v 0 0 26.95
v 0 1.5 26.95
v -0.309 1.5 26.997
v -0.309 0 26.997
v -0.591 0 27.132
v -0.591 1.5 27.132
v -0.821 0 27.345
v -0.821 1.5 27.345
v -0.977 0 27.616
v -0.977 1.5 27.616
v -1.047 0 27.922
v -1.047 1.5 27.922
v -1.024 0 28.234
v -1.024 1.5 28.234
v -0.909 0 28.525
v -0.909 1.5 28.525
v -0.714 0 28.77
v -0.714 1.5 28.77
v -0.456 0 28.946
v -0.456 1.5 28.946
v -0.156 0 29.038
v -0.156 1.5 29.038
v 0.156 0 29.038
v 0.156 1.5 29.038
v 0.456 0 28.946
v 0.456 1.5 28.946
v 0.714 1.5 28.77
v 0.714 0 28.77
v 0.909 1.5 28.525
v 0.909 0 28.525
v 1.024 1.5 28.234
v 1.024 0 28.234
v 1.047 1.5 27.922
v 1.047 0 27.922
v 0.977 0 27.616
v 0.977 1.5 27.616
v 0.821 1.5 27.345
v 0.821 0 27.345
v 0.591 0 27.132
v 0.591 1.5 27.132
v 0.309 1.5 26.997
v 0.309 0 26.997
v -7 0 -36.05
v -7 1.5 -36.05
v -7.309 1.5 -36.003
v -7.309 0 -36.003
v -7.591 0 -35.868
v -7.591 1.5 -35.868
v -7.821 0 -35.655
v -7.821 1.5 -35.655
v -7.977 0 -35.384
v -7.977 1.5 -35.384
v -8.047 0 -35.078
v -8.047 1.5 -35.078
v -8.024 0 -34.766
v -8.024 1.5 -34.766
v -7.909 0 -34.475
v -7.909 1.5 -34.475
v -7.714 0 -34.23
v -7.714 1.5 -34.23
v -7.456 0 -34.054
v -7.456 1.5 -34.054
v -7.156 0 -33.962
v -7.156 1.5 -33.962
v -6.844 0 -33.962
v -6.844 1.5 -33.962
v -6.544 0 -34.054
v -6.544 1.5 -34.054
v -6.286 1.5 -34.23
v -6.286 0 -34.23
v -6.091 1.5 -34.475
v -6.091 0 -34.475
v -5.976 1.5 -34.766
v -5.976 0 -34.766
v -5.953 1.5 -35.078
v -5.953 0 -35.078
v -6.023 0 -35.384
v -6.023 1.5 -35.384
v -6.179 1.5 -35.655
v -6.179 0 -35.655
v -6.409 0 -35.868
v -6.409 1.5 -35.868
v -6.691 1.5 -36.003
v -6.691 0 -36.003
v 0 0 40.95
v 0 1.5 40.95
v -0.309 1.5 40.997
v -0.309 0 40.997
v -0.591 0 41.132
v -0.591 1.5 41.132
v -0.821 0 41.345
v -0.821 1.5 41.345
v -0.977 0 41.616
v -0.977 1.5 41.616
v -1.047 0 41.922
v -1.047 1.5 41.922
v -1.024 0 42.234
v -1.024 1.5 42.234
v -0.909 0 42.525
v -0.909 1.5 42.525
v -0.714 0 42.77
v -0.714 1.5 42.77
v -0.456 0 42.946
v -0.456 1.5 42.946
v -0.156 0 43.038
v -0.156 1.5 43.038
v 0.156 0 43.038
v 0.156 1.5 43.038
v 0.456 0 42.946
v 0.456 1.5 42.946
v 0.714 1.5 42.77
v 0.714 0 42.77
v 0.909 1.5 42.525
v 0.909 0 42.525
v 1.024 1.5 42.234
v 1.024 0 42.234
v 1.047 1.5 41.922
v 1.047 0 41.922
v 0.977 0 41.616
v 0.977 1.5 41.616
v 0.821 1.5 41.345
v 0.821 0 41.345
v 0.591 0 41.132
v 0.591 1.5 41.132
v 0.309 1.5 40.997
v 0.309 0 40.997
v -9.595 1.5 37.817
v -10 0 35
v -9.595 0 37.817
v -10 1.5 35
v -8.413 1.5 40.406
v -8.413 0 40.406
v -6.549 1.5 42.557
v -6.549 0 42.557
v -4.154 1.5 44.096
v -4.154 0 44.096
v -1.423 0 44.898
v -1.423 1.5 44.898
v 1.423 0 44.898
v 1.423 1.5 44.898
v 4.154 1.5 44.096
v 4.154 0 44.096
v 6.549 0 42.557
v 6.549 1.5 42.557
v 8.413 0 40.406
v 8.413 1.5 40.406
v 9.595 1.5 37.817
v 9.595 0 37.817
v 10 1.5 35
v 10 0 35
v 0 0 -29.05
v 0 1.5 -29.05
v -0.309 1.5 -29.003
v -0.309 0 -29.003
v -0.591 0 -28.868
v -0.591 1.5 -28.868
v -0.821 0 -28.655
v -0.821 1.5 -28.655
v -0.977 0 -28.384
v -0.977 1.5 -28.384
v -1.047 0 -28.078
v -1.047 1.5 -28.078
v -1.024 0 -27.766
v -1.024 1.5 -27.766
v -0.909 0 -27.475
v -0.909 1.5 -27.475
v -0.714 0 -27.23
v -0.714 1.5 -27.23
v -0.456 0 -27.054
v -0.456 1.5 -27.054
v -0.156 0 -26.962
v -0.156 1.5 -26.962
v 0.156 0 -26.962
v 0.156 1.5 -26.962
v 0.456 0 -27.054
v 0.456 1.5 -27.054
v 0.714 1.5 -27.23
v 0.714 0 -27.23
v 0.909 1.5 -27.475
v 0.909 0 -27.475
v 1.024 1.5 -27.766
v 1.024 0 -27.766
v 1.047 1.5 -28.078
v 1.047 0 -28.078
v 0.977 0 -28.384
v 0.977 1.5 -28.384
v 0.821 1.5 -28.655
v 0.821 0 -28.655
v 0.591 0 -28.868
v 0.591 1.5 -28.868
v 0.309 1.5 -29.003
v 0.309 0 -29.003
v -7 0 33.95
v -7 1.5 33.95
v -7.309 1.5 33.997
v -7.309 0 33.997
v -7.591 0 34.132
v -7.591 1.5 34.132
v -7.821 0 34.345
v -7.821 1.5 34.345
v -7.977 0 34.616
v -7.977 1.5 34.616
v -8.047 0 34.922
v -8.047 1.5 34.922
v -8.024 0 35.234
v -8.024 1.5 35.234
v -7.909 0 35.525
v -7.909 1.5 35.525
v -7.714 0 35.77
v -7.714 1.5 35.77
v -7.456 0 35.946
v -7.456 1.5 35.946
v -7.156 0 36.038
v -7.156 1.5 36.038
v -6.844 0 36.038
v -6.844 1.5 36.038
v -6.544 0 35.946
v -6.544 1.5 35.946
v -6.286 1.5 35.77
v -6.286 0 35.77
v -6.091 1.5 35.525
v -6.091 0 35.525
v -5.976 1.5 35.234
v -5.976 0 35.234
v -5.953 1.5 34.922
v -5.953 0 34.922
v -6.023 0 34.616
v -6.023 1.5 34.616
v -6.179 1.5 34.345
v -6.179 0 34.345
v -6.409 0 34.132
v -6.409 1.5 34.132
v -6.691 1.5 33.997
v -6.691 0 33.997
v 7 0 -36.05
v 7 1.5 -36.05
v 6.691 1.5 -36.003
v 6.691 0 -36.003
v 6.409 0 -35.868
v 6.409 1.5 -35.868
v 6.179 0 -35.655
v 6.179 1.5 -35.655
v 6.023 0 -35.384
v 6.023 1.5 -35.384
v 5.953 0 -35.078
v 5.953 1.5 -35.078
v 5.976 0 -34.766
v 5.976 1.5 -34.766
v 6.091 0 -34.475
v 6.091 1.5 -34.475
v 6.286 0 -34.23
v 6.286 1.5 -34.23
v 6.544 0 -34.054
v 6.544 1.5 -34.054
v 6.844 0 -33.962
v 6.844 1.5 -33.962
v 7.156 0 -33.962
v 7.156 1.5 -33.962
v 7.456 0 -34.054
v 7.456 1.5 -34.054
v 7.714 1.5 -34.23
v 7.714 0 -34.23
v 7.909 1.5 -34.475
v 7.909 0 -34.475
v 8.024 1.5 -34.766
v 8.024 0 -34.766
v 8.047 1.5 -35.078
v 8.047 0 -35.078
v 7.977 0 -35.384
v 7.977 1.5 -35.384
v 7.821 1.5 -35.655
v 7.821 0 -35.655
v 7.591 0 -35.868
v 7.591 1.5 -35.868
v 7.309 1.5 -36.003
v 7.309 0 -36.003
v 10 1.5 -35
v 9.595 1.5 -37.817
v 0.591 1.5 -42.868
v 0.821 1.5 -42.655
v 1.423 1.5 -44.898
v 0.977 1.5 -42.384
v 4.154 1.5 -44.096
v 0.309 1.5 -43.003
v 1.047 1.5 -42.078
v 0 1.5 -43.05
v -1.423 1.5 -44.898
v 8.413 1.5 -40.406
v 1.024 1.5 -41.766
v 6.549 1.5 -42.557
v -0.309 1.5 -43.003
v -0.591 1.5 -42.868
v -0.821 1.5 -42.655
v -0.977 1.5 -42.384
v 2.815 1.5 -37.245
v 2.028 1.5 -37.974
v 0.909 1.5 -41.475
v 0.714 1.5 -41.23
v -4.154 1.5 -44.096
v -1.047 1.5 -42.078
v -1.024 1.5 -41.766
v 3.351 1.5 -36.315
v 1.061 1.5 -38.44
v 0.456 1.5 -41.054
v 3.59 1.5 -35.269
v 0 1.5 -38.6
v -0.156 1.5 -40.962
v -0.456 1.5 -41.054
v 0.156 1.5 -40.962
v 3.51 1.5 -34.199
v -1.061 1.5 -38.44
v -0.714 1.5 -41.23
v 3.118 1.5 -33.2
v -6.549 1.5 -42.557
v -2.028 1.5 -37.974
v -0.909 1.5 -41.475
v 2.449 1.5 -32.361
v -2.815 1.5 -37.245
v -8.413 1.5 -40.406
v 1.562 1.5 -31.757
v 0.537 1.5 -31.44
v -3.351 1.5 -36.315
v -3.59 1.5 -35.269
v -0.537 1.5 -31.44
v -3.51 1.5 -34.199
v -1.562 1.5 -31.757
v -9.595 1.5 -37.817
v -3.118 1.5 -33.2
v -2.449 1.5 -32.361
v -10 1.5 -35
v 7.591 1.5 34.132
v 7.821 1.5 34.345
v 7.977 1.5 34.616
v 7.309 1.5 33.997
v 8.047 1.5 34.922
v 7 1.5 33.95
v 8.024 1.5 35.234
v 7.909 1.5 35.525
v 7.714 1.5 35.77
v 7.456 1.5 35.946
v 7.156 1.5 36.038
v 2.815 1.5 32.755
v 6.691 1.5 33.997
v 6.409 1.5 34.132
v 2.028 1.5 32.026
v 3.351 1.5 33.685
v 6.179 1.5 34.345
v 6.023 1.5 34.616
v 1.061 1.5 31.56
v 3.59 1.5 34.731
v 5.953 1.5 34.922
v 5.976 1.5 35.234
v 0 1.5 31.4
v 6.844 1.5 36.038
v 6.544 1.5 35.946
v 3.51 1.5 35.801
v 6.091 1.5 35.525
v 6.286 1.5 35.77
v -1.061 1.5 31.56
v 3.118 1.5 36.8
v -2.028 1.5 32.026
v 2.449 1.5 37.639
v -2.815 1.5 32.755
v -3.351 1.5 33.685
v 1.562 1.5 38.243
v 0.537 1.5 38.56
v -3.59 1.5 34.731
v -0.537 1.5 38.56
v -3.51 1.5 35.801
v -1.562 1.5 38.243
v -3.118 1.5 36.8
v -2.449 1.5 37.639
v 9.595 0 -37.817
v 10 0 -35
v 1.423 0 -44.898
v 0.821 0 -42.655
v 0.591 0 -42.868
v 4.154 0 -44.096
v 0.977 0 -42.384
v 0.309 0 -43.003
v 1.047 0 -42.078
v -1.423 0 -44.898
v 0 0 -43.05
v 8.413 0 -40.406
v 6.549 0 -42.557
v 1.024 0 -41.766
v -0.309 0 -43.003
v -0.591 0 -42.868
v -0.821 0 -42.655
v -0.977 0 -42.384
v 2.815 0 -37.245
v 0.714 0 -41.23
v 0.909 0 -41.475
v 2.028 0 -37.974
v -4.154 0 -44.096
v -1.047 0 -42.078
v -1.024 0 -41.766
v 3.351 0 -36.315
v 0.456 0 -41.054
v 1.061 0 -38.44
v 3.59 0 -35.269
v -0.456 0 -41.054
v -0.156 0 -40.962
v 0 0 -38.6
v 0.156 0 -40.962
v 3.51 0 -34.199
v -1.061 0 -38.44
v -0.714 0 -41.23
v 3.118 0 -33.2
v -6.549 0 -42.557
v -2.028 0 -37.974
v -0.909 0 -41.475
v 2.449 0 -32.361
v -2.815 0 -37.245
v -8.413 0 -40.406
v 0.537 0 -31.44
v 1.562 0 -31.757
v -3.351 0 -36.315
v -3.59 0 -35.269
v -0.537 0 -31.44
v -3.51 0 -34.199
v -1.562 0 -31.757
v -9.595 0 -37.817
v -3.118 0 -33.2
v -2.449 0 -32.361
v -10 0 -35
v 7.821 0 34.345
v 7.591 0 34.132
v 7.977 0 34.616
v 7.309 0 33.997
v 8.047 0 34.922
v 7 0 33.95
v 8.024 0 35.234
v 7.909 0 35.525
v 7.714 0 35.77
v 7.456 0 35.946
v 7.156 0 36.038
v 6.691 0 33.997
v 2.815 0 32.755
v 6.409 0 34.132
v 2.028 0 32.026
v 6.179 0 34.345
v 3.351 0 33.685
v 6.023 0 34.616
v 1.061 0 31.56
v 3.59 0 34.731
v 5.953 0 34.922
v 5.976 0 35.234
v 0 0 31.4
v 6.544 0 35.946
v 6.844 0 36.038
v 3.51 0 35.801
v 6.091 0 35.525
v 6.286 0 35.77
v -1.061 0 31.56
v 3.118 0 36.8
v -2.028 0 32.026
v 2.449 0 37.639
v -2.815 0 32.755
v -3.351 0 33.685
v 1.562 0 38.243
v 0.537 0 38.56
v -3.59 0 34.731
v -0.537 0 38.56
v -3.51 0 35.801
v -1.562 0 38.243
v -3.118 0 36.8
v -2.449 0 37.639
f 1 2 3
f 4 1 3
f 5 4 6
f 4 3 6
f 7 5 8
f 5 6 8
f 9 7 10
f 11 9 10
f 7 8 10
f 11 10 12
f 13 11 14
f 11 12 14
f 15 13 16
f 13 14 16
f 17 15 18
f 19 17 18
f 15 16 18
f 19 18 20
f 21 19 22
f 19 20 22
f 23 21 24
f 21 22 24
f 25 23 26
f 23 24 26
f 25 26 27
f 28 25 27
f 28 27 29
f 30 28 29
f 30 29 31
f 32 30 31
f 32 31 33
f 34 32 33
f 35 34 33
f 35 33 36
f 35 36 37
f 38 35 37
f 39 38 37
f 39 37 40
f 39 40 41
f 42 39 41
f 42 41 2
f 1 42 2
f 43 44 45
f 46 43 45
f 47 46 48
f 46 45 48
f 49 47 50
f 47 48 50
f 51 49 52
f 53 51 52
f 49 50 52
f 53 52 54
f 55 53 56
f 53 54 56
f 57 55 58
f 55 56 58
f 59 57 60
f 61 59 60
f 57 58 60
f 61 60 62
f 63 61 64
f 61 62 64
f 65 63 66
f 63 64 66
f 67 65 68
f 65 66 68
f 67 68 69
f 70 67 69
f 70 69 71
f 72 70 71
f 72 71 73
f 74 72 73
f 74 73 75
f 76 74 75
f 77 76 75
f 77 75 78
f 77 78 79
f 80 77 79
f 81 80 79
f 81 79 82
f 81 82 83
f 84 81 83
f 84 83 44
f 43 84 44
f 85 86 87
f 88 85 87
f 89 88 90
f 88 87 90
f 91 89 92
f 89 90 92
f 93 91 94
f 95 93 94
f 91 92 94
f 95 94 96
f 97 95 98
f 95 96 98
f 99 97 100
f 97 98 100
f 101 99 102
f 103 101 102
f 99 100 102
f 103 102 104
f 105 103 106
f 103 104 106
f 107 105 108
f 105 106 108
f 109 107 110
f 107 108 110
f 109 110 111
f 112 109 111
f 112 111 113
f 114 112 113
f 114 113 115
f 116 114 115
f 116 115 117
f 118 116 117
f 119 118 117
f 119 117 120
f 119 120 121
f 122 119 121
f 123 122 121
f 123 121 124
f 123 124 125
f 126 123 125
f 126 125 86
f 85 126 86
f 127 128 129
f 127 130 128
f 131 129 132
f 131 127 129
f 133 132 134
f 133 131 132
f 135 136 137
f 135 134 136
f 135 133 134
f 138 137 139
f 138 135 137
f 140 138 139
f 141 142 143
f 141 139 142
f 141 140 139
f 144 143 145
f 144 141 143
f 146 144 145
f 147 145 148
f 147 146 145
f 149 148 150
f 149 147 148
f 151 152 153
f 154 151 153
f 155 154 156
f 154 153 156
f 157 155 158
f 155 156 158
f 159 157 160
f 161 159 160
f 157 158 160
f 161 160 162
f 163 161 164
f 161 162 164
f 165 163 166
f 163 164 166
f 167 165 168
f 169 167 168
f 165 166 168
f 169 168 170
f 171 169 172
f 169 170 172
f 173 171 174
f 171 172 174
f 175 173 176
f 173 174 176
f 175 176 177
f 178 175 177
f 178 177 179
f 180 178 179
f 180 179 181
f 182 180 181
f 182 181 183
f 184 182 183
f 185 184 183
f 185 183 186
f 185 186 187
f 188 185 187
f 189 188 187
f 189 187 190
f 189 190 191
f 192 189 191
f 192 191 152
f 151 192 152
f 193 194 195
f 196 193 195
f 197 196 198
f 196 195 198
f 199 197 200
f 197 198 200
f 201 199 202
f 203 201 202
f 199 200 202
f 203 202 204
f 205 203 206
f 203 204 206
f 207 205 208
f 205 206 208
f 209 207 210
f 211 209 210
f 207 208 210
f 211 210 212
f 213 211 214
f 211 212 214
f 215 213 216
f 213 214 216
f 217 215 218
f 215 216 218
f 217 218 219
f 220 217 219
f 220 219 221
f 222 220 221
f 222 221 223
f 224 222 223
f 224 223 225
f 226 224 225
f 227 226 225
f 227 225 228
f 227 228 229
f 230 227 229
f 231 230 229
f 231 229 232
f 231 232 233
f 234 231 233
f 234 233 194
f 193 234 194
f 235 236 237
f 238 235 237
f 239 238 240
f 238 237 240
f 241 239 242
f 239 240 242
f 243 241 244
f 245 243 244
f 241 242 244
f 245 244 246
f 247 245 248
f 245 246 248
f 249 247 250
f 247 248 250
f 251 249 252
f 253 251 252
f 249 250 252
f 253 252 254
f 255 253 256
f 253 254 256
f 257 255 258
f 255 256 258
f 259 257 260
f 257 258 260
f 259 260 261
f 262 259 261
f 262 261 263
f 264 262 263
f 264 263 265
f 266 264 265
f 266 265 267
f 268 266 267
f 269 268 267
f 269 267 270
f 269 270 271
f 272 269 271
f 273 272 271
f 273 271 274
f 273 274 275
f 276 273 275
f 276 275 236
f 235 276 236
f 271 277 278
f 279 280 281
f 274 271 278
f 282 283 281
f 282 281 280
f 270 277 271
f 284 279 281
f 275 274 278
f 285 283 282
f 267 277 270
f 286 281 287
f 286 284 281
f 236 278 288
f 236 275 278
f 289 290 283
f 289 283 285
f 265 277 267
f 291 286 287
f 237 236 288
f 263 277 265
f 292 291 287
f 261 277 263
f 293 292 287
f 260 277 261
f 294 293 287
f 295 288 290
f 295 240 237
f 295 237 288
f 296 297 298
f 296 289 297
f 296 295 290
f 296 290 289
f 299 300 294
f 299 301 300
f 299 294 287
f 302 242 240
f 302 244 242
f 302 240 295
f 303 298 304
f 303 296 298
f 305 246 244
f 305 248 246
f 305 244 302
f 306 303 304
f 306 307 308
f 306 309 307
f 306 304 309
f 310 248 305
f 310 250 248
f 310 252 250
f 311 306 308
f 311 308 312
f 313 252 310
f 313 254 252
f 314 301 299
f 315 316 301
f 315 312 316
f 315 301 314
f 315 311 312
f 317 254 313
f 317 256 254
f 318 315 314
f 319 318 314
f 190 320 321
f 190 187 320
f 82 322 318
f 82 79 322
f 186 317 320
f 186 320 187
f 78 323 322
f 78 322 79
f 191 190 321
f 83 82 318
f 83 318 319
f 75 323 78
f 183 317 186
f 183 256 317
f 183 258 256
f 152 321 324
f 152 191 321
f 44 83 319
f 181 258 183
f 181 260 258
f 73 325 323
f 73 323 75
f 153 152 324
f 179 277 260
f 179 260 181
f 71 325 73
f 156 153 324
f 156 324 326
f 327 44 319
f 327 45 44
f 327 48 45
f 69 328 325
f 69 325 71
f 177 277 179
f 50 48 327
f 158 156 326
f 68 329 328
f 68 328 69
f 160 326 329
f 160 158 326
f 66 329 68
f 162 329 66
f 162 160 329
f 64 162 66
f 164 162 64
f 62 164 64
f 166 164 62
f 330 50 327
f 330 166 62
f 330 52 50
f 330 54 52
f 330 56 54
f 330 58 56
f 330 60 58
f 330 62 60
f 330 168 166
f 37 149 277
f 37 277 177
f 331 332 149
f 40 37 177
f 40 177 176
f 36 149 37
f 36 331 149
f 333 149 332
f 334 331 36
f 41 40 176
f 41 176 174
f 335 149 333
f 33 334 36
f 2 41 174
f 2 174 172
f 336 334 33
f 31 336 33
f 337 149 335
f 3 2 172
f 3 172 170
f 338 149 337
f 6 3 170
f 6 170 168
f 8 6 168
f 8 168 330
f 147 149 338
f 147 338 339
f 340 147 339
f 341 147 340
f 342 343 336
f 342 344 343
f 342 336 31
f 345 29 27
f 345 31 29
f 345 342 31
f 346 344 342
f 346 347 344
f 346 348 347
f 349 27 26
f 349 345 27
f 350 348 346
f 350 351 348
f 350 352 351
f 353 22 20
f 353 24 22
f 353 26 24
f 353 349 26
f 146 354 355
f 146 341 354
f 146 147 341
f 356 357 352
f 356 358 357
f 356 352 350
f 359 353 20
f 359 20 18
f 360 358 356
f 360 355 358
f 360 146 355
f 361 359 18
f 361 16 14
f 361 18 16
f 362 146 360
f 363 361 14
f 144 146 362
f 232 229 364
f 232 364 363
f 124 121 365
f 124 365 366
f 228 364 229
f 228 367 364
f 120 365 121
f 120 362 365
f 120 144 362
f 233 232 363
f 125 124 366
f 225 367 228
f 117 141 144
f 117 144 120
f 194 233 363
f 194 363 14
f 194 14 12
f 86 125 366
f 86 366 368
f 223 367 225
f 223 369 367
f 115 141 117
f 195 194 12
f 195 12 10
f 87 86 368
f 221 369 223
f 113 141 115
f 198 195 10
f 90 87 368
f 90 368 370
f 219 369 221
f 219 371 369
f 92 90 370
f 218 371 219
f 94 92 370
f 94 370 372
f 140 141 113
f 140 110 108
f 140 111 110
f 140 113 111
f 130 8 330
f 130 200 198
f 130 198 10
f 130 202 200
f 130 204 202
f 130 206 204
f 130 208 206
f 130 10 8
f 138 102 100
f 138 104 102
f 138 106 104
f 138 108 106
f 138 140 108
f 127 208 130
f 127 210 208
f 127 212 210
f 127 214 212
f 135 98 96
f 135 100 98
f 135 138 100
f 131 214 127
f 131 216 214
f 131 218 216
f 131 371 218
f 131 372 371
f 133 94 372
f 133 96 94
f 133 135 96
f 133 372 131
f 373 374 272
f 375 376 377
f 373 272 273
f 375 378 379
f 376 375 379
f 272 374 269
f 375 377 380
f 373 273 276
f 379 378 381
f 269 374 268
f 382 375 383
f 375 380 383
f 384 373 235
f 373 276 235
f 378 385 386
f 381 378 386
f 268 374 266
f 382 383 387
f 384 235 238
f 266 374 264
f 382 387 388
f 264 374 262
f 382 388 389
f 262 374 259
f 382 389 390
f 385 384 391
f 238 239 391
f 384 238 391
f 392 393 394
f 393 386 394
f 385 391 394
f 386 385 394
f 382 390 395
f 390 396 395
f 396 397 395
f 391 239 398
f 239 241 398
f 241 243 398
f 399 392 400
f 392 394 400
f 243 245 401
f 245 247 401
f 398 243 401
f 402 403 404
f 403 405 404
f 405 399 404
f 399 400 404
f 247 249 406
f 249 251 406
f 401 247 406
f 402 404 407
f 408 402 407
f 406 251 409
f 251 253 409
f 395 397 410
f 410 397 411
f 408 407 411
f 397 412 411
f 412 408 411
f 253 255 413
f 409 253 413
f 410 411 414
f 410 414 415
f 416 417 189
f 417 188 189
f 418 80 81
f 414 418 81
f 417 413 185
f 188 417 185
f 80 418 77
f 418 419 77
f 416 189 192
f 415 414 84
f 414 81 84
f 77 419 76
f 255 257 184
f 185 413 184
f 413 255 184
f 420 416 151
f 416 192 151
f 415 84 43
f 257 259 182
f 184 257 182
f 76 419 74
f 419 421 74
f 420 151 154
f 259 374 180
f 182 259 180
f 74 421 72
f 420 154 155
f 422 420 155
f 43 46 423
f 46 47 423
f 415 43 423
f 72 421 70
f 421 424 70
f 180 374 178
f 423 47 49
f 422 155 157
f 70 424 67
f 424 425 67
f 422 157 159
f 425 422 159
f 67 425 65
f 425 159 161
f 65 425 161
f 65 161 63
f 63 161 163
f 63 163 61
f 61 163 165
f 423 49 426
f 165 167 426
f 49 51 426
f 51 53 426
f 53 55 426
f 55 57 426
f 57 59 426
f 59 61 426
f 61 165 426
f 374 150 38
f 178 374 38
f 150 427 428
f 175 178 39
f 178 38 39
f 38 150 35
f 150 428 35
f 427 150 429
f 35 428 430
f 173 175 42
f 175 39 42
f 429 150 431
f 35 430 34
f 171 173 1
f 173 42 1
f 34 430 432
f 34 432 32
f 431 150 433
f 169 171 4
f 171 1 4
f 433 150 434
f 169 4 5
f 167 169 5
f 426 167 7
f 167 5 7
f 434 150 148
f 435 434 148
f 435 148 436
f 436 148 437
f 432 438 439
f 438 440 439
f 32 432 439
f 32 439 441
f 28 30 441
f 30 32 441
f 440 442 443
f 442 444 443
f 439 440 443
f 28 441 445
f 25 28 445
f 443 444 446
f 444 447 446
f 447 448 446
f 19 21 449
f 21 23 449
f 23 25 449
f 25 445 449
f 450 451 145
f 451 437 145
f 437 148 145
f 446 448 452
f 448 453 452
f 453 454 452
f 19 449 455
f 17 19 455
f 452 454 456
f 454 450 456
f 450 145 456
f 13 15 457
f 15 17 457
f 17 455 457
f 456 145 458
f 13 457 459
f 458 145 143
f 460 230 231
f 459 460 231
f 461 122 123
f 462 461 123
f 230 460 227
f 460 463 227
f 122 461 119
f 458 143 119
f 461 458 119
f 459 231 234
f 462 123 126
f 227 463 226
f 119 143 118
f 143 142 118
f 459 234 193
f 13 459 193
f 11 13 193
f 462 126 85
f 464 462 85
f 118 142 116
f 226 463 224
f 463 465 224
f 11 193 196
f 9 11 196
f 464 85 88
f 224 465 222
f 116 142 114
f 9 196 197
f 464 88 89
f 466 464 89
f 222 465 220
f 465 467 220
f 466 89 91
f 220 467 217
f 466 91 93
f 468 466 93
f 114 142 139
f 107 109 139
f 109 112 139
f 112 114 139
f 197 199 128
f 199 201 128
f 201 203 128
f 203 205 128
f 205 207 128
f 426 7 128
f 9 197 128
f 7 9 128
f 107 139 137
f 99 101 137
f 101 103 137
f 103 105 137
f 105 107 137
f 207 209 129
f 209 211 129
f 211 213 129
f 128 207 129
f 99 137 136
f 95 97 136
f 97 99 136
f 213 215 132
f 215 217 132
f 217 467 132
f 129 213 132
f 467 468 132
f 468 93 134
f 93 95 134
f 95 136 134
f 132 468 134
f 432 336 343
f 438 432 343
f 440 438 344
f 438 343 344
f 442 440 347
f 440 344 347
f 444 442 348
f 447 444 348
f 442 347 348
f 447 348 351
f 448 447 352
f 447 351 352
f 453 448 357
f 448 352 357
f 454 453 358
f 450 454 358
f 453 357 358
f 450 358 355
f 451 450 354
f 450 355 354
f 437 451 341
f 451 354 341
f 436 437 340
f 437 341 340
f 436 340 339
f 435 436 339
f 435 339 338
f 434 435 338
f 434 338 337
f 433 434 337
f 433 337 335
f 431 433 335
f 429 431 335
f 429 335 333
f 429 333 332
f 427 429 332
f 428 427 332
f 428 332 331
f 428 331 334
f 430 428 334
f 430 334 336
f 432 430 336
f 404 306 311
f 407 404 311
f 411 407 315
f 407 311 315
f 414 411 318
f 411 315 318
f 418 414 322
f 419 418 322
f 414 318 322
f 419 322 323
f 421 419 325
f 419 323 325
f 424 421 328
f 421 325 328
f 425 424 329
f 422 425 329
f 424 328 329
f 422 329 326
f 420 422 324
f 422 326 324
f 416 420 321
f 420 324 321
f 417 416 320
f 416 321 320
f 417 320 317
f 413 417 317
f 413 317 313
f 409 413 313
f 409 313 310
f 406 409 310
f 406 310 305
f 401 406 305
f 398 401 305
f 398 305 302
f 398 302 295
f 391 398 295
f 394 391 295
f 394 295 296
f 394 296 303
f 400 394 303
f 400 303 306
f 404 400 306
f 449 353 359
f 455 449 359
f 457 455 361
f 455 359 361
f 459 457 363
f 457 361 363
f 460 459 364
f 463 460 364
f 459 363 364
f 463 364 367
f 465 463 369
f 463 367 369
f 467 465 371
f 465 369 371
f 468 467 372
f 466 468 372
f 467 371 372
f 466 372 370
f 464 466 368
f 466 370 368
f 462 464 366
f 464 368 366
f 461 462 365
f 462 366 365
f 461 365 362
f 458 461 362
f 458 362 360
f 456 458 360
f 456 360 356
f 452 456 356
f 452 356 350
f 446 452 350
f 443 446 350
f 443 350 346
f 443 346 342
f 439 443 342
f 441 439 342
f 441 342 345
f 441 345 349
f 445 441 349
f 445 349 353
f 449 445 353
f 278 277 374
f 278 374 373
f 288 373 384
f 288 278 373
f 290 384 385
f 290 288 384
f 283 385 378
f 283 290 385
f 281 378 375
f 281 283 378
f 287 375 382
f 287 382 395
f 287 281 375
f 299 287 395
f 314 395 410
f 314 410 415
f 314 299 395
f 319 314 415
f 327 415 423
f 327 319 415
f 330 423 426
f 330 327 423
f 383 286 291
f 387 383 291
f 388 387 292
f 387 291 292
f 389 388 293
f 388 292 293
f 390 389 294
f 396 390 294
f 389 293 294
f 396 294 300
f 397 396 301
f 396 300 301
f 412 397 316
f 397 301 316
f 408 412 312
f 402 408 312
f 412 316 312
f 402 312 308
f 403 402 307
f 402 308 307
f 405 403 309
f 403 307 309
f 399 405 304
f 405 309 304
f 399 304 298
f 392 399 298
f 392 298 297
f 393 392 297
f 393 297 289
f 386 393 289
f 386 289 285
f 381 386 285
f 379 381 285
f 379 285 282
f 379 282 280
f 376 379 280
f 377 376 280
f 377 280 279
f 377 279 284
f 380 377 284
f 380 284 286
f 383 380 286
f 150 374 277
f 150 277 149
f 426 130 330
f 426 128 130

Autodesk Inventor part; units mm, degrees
ref_plane "YZ Plane" through (0, 0, 0) normal (1, 0, 0) x (0, 1, 0)
ref_plane "XZ Plane" through (0, 0, 0) normal (0, 1, 0) x (-1, 0, 0)
ref_plane "XY Plane" through (0, 0, 0) normal (0, 0, 1) x (1, 0, 0)
sketch "Sketch1" plane through (0, 0, 0) normal (0, 1, 0) x (-1, 0, 0)
  line L0 (10, -45) -> (-10, -45)
  line L1 (-10, -45) -> (-10, 45)
  line L2 (-10, 45) -> (10, 45)
  line L3 (10, 45) -> (10, -45)
  point P0 (0, 0)
  dimension "d0" = 20
  dimension "d1" = 90
  dimension "d2" = 45
  dimension "d3" = 10
extrude "Plate1" add sketch "Sketch1" along normal blind 1.5
sketch "Sketch2" plane through (0, 0, 0) normal (0, -1, 0) x (1, 0, 0)
  circle A0 centre (0, 42) radius 0.7835 projected
  circle A1 centre (-7, 35) radius 0.7835 projected
  circle A2 centre (0, 28) radius 0.7835 projected
  circle A3 centre (7, 35) radius 0.7835 projected
  circle A4 centre (0, -28) radius 0.7835 projected
  circle A5 centre (-7, -35) radius 0.7835 projected
  circle A6 centre (0, -42) radius 0.7835 projected
  circle A7 centre (7, -35) radius 0.7835 projected
  point P0 (0, 0)
hole "Hole1" at (0, 0, 42) at (-7, 0, 35) at (0, 0, 28) at (7, 0, 35) at (0, 0, -28) at (-7, 0, -35) at (0, 0, -42) at (7, 0, -35) direction (0, 1, 0) diameter 2.1 depth 1.5
sketch "Sketch3" plane through (0, 1.5, 0) normal (0, 1, 0) x (1, 0, 0)
  arc A0 (10, 35) -> (-10, 35) centre (0, 35) ccw
  arc A1 (-10, -35) -> (10, -35) centre (0, -35) ccw
  line L0 (-10, 35) -> (-10, -35)
  line L1 (10, 35) -> (10, -35)
  line L2 (10, 45) -> (10, -45) projected
  line L3 (-10, 45) -> (10, 45)
  line L4 (10, 45) -> (10, -45)
  line L5 (10, -45) -> (-10, -45)
  line L6 (-10, -45) -> (-10, 45)
  point P0 (0, 0)
  point P1 (0, 45)
  point P2 (10, 35)
  point P3 (-10, -35)
  point P4 (0, -45)
  point P5 (10, -35)
  dimension "d12" = 35
  dimension "d13" = 35
  dimension "d14" = 10
  dimension "d15" = 10
  dimension "d16" = 10
  dimension "d17" = 20
  dimension "d18" = 90
extrude "Extrusion1" cut sketch "Sketch3" against normal blind 10 contours A0 L3 L2 | A0 L6 L3 | L2 L5 A1 | L5 L6 A1
sketch "Sketch4" plane through (0, 0, 0) normal (0, -1, 0) x (1, 0, 0)
  arc A0 (-10, -35) -> (10, -35) centre (0, -35) ccw projected
  arc A1 (10, 35) -> (-10, 35) centre (0, 35) ccw projected
  point P0 (0, 0)
hole "Hole2" at (0, 0, 35) at (0, 0, -35) direction (0, 1, 0) diameter 7.2 depth 1.5
equation "\"d10\" = Thickness"
equation "\"d26\" = Thickness"
equation "\"d4\" = Thickness"
equation "\"BendReliefWidth\" = Thickness"
equation "\"BendReliefDepth\" = 0.5 * Thickness"
equation "\"CornerReliefSize\" = 4 * Thickness"
equation "\"MinimumRemnant\" = 2 * Thickness"
equation "\"TransitionRadius\" = BendRadius"
equation "\"JacobiRadiusSize\" = BendRadius"
equation "\"GapSize\" = Thickness"
equation "\"Thickness\" = 1.5"
equation "\"BendRadius\" = 0.31"
properties part number "axis_10_11-connector_frame" material "Aluminum 6061-AHC"
